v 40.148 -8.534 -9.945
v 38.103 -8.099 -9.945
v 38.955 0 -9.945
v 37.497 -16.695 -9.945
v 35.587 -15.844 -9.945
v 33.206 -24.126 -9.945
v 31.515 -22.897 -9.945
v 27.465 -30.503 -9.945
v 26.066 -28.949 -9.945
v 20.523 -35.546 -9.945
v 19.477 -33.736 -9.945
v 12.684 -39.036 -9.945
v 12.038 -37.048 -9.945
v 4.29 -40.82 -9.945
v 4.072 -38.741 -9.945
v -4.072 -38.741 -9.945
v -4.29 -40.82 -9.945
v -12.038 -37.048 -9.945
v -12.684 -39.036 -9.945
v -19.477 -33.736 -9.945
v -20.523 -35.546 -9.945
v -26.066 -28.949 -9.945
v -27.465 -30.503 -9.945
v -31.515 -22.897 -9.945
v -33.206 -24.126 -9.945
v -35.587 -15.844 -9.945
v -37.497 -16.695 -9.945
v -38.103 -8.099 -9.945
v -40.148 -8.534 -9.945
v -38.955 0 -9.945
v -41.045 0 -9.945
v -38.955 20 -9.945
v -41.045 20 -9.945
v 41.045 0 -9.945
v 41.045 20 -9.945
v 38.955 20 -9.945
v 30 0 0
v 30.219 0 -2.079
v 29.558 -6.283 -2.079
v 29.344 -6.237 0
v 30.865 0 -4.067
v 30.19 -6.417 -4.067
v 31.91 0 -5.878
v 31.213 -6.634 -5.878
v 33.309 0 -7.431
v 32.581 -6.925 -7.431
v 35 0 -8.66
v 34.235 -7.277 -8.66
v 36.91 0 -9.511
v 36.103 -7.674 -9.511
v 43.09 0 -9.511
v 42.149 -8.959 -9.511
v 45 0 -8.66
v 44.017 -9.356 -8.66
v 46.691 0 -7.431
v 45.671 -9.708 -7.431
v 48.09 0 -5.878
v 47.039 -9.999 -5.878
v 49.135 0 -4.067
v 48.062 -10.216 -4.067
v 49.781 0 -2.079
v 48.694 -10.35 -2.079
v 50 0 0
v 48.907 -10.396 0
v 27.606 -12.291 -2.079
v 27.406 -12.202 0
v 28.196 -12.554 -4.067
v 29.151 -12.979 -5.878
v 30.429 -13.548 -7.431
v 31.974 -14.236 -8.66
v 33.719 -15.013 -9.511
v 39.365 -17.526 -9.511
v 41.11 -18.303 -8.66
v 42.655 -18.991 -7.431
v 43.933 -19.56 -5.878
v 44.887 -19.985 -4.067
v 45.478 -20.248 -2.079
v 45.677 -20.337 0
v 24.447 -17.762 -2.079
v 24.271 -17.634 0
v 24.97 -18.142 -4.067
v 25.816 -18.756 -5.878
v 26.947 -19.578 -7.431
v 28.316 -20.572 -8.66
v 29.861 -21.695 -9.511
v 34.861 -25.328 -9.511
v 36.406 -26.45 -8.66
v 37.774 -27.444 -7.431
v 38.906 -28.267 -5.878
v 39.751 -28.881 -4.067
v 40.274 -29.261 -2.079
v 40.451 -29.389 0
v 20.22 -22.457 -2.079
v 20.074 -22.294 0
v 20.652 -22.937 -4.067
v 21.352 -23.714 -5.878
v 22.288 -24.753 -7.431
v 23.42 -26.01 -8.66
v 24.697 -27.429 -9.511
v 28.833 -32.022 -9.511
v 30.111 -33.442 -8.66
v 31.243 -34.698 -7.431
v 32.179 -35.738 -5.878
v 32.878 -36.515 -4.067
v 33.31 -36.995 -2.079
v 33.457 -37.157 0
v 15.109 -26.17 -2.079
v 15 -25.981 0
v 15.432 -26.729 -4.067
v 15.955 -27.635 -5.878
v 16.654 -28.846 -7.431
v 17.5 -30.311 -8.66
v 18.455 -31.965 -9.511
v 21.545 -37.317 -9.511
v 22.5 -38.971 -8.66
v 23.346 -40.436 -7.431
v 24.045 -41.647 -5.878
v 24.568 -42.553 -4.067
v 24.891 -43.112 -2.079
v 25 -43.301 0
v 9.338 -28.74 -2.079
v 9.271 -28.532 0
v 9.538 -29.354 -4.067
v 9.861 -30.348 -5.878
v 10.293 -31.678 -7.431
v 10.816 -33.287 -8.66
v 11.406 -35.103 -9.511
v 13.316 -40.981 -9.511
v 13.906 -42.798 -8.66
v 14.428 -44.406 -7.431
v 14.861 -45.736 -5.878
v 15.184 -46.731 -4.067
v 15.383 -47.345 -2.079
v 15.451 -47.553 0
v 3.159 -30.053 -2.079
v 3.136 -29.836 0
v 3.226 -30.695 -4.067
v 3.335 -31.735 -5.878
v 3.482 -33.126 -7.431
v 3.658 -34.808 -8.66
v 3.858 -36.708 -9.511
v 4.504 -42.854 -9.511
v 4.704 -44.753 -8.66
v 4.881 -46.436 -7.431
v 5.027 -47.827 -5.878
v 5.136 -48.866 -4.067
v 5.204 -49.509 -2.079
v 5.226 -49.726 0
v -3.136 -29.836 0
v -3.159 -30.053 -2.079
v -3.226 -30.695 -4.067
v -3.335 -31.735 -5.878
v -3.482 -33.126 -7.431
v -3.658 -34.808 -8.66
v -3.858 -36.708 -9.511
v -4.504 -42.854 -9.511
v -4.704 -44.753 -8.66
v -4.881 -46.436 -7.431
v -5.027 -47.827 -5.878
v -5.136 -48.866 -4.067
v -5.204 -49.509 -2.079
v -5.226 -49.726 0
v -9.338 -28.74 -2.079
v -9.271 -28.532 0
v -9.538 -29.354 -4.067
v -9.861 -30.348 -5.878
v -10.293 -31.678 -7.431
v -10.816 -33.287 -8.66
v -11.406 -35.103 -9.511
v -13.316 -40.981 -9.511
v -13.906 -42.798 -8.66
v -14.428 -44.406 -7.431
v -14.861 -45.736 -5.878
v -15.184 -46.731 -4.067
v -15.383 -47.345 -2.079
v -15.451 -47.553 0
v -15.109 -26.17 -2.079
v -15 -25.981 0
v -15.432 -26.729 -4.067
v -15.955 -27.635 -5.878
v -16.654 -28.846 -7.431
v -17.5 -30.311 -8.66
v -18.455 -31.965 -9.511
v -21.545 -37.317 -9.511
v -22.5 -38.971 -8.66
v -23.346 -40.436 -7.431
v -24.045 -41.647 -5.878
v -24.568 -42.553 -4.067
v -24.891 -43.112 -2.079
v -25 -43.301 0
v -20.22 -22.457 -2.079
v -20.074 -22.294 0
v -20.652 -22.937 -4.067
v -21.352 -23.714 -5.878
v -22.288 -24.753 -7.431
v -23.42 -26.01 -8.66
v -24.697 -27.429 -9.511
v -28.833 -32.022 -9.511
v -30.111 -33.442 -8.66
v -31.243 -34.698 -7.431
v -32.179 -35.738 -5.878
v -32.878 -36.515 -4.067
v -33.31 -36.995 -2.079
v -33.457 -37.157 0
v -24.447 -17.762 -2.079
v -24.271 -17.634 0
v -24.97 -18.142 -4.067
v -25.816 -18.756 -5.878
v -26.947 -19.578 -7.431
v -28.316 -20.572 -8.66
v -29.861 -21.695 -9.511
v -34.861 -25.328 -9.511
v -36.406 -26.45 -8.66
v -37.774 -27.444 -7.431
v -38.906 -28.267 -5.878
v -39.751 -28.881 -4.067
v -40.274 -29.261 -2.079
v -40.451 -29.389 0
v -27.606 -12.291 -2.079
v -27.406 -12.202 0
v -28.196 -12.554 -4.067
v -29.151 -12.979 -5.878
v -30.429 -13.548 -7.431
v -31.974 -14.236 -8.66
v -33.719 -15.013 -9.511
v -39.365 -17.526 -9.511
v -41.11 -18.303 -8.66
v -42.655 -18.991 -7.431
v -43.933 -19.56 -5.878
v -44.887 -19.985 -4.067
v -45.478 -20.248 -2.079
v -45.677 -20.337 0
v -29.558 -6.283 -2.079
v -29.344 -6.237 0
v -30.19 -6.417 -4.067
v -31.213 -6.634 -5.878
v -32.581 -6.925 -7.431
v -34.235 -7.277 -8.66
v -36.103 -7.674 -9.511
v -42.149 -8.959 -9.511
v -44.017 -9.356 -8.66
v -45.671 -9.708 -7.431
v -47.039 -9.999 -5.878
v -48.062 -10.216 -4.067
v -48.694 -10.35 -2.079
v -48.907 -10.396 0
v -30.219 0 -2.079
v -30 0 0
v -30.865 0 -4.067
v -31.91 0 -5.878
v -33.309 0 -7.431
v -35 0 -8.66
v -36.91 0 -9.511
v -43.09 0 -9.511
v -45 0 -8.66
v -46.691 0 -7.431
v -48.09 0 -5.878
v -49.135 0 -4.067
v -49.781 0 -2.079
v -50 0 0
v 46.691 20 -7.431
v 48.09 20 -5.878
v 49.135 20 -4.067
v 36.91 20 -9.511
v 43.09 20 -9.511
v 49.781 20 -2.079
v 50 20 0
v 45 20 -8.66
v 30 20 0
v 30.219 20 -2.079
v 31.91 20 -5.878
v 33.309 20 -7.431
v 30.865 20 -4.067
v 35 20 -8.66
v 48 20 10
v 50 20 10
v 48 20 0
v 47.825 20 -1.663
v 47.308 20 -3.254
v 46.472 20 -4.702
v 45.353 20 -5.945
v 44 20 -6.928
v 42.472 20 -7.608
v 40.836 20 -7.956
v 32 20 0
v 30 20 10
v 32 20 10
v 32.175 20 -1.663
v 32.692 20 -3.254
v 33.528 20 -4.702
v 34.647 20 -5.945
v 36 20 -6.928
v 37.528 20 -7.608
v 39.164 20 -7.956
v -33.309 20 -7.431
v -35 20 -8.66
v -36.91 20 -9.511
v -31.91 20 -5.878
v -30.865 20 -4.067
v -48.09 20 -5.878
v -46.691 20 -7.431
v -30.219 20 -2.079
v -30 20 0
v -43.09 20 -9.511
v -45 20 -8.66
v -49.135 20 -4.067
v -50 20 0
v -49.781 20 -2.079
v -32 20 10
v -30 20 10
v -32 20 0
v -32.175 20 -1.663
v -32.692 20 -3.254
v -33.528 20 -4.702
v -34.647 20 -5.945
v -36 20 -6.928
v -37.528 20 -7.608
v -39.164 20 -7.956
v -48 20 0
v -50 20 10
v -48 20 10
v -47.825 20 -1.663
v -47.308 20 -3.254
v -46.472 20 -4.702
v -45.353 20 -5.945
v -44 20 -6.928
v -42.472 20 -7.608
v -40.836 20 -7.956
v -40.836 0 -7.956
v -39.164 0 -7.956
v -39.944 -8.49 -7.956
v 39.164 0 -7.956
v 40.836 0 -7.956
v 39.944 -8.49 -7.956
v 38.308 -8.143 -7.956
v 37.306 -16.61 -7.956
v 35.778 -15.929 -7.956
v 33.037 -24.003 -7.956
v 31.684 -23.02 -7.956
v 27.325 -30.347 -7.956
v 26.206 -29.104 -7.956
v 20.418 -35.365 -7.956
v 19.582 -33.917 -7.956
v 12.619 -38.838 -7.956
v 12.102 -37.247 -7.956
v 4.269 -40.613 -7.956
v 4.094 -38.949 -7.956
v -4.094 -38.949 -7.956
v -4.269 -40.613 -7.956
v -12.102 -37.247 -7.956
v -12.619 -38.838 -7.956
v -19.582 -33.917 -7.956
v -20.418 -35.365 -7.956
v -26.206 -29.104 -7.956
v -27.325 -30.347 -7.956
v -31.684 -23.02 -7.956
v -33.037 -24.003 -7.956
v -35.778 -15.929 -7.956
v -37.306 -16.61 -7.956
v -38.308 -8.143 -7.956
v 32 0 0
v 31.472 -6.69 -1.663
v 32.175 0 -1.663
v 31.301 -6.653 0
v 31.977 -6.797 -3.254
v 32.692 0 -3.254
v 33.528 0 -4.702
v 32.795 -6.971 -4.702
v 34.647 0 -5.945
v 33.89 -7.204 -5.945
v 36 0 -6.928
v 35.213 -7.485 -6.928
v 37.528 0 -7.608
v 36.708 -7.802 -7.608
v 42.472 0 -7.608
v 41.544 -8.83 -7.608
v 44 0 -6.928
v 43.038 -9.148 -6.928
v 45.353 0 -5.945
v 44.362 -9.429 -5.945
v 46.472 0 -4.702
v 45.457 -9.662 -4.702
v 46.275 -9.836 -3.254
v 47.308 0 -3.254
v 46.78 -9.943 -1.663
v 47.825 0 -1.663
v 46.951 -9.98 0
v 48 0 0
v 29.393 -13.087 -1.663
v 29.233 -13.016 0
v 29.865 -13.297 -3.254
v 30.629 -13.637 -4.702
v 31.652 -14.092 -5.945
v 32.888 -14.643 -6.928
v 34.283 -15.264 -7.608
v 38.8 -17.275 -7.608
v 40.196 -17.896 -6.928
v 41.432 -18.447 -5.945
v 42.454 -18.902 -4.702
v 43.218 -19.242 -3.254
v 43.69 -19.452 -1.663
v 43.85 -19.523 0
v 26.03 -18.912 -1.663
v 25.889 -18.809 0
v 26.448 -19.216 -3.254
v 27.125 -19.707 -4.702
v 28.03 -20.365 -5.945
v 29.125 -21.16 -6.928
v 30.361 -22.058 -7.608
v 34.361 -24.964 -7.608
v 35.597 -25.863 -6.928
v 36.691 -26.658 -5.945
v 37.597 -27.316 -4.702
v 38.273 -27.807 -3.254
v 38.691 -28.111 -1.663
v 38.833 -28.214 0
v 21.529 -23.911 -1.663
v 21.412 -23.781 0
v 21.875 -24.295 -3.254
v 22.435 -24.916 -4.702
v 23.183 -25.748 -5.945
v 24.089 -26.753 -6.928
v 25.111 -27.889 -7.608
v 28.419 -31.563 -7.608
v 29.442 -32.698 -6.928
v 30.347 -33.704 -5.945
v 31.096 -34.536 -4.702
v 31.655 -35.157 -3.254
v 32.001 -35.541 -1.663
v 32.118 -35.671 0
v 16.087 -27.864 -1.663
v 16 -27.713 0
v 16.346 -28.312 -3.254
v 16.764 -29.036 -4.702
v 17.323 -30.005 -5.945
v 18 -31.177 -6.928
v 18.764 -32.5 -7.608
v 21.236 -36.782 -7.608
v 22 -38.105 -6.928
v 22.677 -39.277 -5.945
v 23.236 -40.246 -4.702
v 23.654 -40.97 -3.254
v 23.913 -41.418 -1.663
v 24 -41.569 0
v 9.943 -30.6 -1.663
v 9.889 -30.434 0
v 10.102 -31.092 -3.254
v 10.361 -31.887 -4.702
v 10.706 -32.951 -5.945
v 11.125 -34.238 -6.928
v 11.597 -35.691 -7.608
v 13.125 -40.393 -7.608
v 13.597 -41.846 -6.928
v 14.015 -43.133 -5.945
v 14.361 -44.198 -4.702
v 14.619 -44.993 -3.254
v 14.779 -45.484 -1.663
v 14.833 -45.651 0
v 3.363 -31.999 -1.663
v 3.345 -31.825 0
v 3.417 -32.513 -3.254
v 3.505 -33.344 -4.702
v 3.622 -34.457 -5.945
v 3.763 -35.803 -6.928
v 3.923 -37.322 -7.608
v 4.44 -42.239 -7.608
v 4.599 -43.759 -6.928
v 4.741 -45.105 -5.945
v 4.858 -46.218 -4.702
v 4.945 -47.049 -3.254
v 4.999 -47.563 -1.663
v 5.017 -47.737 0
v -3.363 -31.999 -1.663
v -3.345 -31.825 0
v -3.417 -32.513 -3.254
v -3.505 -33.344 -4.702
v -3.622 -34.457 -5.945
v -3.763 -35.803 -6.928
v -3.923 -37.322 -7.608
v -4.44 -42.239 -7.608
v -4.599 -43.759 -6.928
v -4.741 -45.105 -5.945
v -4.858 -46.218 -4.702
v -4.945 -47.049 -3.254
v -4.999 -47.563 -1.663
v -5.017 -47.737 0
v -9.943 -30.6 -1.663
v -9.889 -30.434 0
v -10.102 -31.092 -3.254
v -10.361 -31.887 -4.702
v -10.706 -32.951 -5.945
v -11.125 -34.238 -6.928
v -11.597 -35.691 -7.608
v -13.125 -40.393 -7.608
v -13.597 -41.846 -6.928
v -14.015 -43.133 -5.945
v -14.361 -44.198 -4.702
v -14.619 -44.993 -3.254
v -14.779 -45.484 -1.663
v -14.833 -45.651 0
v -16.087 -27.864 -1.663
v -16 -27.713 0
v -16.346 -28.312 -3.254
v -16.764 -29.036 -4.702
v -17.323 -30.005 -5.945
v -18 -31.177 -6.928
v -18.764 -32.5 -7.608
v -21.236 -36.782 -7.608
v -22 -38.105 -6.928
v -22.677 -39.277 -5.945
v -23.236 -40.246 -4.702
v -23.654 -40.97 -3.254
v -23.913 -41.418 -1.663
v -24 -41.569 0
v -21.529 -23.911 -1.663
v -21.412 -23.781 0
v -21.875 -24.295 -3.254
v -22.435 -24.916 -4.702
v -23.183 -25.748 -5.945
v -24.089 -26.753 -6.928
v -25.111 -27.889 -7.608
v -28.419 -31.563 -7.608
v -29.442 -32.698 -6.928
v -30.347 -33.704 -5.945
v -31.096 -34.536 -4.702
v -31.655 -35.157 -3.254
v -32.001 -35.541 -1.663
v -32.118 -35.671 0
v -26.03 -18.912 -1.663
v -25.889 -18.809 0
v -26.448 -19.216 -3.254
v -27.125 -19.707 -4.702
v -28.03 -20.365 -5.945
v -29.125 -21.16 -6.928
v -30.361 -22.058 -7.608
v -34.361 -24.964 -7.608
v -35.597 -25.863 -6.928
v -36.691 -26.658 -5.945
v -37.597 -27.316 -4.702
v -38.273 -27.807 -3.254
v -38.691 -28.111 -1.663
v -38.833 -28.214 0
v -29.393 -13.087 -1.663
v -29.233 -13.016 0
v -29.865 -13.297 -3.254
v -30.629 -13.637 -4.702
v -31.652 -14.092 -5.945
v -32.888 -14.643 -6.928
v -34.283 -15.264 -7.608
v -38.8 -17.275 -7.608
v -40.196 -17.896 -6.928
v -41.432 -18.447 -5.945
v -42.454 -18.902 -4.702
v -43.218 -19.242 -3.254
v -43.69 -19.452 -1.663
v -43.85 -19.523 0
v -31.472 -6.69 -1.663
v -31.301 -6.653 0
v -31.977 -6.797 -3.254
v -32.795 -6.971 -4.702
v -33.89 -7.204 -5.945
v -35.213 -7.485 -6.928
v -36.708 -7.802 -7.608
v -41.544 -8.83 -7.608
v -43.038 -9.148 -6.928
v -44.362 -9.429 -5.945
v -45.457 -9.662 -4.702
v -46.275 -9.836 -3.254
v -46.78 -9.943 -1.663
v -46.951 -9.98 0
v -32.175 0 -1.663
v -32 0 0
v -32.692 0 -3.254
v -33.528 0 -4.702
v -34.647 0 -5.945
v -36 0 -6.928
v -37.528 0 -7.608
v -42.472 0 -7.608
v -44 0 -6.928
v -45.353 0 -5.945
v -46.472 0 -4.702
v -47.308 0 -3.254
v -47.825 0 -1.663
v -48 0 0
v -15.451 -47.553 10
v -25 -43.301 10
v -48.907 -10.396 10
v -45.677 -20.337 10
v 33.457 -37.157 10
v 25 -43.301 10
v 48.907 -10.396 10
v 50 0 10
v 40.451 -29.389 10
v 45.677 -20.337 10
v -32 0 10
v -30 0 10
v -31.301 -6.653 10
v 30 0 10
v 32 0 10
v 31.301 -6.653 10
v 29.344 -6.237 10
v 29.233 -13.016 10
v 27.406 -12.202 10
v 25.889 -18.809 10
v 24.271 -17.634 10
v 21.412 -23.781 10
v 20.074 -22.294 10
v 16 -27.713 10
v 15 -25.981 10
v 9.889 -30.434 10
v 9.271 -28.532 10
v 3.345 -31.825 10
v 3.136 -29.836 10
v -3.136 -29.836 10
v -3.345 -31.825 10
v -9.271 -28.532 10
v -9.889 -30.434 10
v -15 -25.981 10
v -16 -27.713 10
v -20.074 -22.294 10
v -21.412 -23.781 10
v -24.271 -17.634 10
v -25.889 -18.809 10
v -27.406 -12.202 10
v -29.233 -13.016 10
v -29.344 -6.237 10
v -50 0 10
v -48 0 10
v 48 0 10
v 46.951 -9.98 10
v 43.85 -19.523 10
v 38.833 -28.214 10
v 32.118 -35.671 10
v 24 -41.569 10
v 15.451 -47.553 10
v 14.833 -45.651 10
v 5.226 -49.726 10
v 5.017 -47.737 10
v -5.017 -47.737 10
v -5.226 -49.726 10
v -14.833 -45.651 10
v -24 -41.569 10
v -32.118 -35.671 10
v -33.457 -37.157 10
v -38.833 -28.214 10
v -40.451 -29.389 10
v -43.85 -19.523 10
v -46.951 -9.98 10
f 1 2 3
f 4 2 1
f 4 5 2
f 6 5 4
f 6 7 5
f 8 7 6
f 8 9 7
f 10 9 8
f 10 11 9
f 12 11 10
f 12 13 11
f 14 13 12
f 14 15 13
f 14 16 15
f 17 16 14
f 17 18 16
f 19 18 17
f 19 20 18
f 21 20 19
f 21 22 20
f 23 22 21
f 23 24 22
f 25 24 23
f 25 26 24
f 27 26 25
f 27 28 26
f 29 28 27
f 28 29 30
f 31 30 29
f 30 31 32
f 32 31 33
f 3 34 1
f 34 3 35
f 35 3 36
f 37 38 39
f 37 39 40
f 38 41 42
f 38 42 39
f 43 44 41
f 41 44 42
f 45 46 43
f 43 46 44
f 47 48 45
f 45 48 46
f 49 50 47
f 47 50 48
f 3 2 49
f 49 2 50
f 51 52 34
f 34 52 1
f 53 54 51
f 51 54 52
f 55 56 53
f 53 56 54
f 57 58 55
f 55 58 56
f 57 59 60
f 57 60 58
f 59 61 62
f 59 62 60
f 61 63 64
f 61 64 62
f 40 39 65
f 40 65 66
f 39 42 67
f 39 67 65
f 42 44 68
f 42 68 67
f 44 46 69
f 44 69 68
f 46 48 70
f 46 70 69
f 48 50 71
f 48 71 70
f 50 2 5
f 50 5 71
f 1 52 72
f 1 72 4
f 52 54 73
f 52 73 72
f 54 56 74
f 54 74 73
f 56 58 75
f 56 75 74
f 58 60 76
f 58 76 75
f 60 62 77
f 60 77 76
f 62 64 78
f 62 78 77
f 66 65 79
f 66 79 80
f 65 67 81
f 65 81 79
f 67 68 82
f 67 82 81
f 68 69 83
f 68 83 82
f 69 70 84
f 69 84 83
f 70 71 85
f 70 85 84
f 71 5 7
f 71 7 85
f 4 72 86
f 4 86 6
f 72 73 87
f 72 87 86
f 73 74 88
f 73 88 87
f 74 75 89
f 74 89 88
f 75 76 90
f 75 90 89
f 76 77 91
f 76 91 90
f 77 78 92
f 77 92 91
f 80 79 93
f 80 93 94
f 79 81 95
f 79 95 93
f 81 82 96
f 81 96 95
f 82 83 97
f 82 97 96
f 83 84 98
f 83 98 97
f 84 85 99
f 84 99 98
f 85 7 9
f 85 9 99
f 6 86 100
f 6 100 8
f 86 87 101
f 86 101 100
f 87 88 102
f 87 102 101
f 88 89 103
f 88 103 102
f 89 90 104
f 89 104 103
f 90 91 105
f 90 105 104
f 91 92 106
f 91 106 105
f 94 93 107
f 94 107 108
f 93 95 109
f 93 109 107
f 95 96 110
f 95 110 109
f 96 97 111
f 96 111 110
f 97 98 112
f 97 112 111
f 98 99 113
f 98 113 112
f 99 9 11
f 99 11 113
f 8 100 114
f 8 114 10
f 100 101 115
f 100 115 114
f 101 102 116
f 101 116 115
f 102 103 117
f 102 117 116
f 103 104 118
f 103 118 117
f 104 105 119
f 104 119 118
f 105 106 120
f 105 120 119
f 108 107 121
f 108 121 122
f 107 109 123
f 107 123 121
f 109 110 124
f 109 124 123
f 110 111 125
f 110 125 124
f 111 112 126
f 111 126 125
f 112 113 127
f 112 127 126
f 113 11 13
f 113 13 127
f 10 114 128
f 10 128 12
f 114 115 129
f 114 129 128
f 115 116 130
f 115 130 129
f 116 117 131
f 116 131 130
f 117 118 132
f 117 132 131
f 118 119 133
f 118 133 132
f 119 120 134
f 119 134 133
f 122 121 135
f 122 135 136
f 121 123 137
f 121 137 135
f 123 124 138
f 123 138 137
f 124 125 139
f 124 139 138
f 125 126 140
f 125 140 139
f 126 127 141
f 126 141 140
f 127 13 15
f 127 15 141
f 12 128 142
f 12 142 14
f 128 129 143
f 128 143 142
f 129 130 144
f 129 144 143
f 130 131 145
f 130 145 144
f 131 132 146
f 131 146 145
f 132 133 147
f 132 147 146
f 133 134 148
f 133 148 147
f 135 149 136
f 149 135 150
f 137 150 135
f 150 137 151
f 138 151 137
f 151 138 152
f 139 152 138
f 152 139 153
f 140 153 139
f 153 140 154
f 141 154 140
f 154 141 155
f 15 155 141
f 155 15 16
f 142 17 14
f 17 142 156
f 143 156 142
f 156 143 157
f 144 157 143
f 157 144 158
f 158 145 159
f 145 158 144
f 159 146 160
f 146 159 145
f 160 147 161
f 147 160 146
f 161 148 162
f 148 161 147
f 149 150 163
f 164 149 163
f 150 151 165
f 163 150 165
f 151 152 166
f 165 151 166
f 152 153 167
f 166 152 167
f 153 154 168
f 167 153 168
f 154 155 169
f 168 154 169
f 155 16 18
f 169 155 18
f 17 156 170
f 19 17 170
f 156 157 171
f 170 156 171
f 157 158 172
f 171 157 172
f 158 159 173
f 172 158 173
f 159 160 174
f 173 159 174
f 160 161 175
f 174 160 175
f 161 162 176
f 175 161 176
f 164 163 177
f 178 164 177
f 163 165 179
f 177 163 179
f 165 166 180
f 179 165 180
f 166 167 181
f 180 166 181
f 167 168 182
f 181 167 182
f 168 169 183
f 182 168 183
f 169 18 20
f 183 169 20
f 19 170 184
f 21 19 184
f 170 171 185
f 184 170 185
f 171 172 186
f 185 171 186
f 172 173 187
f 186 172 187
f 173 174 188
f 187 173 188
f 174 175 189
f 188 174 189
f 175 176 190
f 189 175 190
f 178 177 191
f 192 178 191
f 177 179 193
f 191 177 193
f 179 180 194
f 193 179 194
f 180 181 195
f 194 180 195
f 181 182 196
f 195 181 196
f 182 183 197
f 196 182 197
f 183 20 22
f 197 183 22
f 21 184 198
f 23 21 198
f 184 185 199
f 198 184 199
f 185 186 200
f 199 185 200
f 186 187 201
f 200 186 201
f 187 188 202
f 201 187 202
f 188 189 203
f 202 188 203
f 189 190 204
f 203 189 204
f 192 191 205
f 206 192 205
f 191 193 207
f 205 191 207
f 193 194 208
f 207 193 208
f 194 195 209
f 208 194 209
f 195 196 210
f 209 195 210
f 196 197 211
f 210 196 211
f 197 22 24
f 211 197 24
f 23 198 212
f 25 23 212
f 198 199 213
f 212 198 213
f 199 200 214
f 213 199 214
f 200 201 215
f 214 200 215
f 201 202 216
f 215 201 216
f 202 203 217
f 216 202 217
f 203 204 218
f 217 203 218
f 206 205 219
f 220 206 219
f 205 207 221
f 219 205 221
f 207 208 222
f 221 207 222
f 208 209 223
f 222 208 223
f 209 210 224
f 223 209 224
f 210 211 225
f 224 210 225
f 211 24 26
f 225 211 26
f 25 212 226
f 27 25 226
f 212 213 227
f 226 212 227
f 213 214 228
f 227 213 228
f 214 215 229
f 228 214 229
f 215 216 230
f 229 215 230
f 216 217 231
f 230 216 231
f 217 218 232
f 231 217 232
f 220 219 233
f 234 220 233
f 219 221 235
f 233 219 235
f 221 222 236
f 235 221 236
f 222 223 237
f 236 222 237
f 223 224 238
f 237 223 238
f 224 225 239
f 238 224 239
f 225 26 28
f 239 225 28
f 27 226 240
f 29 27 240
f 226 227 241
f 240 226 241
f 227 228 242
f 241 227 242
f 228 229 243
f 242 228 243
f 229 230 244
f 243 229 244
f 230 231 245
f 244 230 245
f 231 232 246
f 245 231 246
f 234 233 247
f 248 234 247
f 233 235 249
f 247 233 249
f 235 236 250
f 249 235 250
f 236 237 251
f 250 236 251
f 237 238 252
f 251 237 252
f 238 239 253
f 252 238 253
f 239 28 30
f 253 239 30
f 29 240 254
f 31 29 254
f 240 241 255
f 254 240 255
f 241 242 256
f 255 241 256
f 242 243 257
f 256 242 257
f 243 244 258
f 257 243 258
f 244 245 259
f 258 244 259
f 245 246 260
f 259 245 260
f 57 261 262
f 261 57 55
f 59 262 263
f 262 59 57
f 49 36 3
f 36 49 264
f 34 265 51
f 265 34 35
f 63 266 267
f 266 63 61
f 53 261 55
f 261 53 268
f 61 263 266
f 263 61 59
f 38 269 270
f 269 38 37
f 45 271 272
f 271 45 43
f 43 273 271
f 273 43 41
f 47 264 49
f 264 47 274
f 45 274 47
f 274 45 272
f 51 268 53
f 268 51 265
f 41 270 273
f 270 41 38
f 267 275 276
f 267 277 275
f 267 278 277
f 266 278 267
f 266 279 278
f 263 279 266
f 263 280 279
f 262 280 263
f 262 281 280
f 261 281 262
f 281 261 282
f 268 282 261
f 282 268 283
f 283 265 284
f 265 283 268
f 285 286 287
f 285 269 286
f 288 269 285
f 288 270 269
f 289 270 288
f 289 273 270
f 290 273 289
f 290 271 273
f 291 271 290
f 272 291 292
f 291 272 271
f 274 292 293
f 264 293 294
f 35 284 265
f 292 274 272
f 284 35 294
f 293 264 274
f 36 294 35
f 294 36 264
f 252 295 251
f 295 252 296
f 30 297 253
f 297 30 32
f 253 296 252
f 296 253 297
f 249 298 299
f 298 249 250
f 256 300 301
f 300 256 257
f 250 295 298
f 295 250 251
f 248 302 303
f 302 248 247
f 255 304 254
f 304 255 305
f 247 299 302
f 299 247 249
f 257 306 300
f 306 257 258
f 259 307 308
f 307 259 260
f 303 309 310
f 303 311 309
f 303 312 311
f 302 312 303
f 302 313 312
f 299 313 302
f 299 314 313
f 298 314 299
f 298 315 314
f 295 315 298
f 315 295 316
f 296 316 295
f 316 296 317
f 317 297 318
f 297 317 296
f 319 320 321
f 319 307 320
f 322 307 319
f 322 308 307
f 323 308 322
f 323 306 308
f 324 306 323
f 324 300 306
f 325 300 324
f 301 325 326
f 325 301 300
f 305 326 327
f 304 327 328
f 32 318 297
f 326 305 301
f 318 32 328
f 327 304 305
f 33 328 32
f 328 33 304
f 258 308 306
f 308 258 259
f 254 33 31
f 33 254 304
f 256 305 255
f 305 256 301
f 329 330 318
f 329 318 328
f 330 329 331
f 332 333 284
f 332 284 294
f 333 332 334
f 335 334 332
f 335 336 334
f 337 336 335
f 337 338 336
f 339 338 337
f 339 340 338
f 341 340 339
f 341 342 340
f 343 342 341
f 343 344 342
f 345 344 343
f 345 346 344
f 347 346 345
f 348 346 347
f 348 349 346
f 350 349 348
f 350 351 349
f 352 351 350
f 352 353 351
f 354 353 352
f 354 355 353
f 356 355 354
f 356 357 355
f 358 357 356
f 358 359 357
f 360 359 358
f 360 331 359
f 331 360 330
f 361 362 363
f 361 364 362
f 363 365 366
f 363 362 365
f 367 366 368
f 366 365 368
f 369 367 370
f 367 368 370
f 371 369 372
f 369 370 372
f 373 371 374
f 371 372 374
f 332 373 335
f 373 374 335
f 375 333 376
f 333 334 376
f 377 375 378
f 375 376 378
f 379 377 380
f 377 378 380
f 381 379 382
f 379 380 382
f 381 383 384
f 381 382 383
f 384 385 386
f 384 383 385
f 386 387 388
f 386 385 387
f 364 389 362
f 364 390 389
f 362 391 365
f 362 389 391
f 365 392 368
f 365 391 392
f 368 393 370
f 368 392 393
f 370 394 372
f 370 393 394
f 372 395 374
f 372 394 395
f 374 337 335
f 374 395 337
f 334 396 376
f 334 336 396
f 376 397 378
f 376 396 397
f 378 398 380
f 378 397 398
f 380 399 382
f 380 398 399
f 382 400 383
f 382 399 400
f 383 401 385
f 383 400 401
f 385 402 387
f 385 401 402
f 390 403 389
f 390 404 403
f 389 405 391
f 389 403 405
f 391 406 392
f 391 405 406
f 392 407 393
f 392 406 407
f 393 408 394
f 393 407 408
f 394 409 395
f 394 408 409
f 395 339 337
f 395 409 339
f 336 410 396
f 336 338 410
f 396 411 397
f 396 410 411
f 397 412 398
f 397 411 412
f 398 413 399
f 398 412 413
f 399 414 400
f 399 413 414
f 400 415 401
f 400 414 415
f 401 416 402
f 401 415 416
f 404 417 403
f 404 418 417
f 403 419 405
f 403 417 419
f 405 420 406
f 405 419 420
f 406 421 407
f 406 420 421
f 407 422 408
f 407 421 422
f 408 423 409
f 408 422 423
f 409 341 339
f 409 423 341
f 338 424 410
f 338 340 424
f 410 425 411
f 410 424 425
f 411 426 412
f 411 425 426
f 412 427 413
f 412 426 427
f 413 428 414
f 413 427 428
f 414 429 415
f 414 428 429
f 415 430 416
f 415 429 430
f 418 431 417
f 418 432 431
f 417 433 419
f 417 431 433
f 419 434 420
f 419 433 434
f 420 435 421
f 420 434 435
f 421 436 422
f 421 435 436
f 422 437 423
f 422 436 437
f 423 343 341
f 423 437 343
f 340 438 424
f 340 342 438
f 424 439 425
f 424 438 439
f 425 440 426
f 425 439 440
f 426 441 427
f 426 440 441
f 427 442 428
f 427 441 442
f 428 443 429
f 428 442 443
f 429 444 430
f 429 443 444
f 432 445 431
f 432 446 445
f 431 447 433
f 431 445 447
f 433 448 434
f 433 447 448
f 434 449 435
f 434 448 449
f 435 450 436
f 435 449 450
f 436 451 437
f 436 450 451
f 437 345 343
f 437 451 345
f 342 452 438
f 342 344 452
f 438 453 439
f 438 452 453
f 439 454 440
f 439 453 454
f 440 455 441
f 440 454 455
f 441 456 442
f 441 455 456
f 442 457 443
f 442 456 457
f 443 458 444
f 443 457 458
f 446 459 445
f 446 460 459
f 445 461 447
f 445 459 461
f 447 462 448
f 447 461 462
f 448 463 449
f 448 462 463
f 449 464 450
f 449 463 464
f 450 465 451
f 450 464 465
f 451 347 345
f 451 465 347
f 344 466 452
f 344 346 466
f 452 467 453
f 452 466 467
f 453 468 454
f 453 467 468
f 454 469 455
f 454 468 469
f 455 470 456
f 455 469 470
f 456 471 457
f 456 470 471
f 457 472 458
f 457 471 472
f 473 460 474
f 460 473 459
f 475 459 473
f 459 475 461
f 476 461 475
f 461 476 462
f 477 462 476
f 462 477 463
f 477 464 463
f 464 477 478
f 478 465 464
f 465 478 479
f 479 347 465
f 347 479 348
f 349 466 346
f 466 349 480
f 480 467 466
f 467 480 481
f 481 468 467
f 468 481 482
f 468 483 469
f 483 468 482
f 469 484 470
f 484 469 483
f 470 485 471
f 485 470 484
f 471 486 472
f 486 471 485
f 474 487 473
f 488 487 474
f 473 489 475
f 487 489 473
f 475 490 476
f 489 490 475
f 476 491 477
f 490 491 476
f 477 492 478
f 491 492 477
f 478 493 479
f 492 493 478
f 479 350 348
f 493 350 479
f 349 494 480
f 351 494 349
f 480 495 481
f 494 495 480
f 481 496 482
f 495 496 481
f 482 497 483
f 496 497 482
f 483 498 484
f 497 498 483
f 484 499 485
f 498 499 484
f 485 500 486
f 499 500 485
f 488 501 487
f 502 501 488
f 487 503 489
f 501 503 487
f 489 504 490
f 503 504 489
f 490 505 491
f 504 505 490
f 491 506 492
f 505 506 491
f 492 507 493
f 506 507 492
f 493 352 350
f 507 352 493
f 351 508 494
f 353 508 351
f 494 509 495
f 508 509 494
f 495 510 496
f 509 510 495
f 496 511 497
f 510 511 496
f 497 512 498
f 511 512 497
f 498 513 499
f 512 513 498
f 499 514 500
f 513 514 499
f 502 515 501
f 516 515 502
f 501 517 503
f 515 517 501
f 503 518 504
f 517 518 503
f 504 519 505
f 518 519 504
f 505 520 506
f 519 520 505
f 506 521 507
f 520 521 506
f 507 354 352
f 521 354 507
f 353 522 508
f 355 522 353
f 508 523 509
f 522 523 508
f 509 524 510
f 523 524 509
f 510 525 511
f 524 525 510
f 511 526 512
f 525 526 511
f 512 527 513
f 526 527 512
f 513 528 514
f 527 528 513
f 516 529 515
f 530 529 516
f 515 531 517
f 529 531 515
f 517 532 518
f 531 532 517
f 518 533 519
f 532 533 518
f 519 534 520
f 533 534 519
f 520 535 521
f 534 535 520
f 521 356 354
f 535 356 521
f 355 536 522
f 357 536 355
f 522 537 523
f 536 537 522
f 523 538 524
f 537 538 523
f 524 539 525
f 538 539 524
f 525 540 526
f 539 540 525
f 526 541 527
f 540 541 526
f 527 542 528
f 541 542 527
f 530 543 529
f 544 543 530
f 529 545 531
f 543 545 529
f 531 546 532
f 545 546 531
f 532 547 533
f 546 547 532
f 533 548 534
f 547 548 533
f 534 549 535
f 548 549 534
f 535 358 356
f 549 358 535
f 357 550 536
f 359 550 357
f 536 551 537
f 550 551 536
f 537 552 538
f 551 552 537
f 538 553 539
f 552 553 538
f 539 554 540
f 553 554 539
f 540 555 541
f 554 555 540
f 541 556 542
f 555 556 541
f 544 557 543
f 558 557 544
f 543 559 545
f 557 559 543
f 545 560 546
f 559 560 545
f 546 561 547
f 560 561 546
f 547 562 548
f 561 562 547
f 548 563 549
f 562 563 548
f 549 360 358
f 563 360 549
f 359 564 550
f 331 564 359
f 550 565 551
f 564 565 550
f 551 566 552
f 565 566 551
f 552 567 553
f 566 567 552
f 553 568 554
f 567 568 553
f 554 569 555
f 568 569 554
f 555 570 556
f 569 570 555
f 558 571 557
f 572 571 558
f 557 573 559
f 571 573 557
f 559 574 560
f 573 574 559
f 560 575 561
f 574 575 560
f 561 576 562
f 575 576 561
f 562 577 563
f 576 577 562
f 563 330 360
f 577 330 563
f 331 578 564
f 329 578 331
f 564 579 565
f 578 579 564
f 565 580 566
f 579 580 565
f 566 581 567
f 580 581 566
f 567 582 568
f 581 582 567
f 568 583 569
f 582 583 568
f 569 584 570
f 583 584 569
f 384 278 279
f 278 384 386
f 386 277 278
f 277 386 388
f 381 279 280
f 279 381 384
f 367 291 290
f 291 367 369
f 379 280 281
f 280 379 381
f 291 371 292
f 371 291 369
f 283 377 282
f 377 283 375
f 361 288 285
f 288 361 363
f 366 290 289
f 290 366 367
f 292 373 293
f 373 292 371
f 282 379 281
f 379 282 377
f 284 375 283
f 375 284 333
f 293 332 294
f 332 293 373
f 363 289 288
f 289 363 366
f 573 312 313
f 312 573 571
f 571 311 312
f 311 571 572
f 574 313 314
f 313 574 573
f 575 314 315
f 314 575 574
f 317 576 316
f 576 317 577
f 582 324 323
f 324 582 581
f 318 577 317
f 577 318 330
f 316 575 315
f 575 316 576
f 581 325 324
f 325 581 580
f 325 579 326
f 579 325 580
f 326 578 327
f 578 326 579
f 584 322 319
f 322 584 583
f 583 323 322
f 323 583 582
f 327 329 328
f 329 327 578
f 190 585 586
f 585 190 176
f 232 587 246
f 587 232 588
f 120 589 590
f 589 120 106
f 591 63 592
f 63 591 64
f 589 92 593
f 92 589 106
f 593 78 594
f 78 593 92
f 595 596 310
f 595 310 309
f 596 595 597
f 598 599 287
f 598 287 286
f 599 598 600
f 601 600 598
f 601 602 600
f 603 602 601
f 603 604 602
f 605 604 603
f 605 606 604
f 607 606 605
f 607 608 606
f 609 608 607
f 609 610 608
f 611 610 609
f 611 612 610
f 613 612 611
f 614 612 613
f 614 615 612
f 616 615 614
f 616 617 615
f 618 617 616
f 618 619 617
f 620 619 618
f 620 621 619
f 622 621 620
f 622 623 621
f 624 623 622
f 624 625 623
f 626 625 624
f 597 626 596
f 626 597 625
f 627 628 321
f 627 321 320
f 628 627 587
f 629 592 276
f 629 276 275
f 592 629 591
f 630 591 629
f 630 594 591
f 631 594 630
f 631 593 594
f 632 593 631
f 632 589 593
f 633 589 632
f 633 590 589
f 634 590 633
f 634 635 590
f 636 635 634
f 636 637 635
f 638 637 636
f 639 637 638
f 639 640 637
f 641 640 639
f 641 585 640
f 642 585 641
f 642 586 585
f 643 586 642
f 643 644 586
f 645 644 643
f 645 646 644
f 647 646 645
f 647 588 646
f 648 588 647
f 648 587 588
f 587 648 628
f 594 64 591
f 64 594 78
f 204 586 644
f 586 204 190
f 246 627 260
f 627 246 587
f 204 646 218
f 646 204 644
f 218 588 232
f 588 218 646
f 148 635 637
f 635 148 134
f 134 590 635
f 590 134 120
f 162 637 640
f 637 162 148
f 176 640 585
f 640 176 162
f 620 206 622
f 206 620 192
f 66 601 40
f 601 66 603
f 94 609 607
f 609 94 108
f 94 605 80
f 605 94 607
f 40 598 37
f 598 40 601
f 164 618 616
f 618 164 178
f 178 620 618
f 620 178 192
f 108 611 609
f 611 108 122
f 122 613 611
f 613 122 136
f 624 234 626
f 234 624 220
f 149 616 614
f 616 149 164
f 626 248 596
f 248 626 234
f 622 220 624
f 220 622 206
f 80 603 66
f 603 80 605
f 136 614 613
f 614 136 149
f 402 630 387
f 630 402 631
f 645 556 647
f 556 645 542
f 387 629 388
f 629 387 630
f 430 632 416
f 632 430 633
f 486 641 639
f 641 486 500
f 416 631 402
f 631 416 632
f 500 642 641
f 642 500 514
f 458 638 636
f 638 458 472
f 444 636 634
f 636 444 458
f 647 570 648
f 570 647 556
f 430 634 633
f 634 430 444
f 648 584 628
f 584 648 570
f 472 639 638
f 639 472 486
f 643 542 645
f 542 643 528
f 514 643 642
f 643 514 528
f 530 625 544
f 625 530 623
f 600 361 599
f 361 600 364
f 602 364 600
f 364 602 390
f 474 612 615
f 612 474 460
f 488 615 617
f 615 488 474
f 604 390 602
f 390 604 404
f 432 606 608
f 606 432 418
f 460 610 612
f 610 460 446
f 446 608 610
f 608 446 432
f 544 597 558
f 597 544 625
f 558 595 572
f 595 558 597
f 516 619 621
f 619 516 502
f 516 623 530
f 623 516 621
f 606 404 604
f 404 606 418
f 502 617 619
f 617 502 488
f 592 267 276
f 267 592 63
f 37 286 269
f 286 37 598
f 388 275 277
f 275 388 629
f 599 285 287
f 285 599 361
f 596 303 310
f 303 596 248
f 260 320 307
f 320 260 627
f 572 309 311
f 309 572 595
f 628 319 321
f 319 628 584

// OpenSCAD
// file: bend.scad
difference() {
  u(40,10,20);
  u(40,8,21);
  translate([-50,-50,0]) cube([50*2,100,10]);
}


difference() {
difference() {
  cylinder(r=40+10,h=10);
  translate([0,0,-0.1]) cylinder(r=40-10,h=10.2);
}

translate([0,0,-0.1]) difference() {
  cylinder(r=40+8,h=10.2);
  translate([0,0,-0.1]) cylinder(r=40-8,h=10.4);
}
  translate([-50,0,-0.1]) cube([50*2,100,10.2]);

}

translate([30,0,0]) difference() {
  cube([20,20,10]);
  translate([2,0,-0.1]) cube([16,21,10.2]);
}


translate([-50,0,0]) difference() {
  cube([20,20,10]);
  translate([2,0,-0.1]) cube([16,21,10.2]);
}


module u(r1,r2,h) {
  difference() {
    torus(r1,r2);
    translate([-(r1+r2),0,-r2]) cube([(r1+r2)*2,(r1+r2),r2*2]);
  }
  translate([r1,0,0]) rotate([-90,0,0]) cylinder(r=r2,h=h);
  translate([-r1,0,0]) rotate([-90,0,0]) cylinder(r=r2,h=h);

}

module torus(r1,r2) {
  rotate_extrude(convexity = 10, $fn=$fn)
    translate([r1, 0, 0])
    circle(r = r2, $fn=$fn);
}
// file: fillet.scad
/*Fillet modules*/ {
    module myfillet(r=1.0,steps=3,include=true) {
      if(include) for (k=[0:$children-1]) {
        children(k);
      }
      for (i=[0:$children-2] ) {
        for(j=[i+1:$children-1] ) {
        fillet_two(r=r,steps=steps) {
          children(i);
          children(j);
          intersection() {
            children(i);
            children(j);
          }
        }
        }
      }
    }

    module fillet_two(r=1.0,steps=3) {
      for(step=[1:steps]) {
        hull() {
           render() intersection() {
            children(0);
            offset_3d(r=r*step/steps) children(2);
          }
           render() intersection() {
            children(1);
            offset_3d(r=r*(steps-step+1)/steps) children(2);
          }
        }
      }
    }

    module offset_3d(r=1.0) {
      for(k=[0:$children-1]) minkowski() {
        children(k);
        sphere(r=r,$fn=8);
      }
    }

}
// file: BOSL2/std.scad
// Minimal BOSL2 compatibility shim for bundled gallery models.
// It implements only the helpers used by the imported OpenSCAD projects.

CENTER = [0, 0, 0];
BOTTOM = [0, 0, -1];
TOP = [0, 0, 1];
LEFT = [-1, 0, 0];
RIGHT = [1, 0, 0];
FRONT = [0, -1, 0];
BACK = [0, 1, 0];

module up(z=0) {
    translate([0, 0, z]) children();
}

module down(z=0) {
    translate([0, 0, -z]) children();
}

module attach(anchor=CENTER) {
    children();
}

module cuboid(size=[1, 1, 1], anchor=CENTER) {
    center = anchor == CENTER;
    translate(center ? [0, 0, 0] : [0, 0, size[2] / 2])
        cube(size, center=true);
    children();
}

module xcyl(h=1, r=1, anchor=CENTER) {
    center = anchor == CENTER;
    translate(center ? [0, 0, 0] : [h / 2, 0, 0])
        rotate([0, 90, 0])
            cylinder(h=h, r=r, center=true);
}
// main file
include <BOSL2/std.scad>;
include <fillet.scad>;
include <bend.scad>;

$fn = $preview ? 15 : 30;

// Fillet params
fillet_r = 4.25;
fillet_steps = $preview ? 4 : 6;

// Plate parameters
plate_w = 83;
plate_l = 110;
plate_t = 4;
curve_r = 225;

ellipse_fn = $preview ? 20 : 100;
bend_fn = $preview ? 8 : 25;
curve_fn = bend_fn/(plate_l/(2*PI*curve_r)) / 4;


// Nub parameters
nub_h = 9;
nub_base_d = 5;
nub_ball_d = 4.5;
nub_arc = 11.5;
nub_angle = 5;

// Belt measurements
belt_w = 38;
belt_t = 3;

// Bolt Holder parameters
// This is how high the centre of the bolt hole is
holder_h = 6;
holder_w = 9;
holder_t = 11;
holder_arc = 5.5;
hole_d = 3.5;
// distance between belt and holder on either side
belt_holder_gap = 2;
holder_spacing = belt_w + 2*belt_holder_gap;

// Back text
line1 = "Toshi Taperek";
line2 = "UCalgary GNCTR 2024";
back_text_size = 3;
line_spacing = 2*back_text_size;
text_depth = 0.5;
include_signature = false;

// Logo
y_padding = 10;
include_logo = false;

trim_w = 6;
trim_h = 2;
emboss_depth = 2;


module plate()
{
	zrot(90)
	down(trim_h)
	xrot(
		-360*plate_l/(2*PI*curve_r)/2,
		cp=[0, 0, curve_r]
	)
	cylindric_bend(
		[plate_w, plate_l, plate_t+trim_h],
		curve_r,
		$fn=bend_fn
	)
	up(plate_t+trim_h)
	zflip()
	{
		translate([plate_w/2, plate_l/2, 0])
		resize([plate_w, plate_l, plate_t])
		cyl(l=1, d=1, anchor=BOTTOM, $fn=ellipse_fn);
		
		/*
		color("red")
		translate([y_padding, plate_l/2, plate_t])
		xflip()
		resize([0, plate_w - 2*y_padding, 0], auto=true)
		zrot(90)
		left(88.25)
		linear_extrude(emboss_depth)
		import(
			"/home/toshi/gnctr/logo/logo_inside.svg"
		);*/
		
		translate([plate_w/2, plate_l/2, plate_t])
		resize([plate_w, plate_l, trim_h*2])
		torus(plate_w, trim_w/2, $fn=ellipse_fn);
	}
}


module nub()
{
    cylinder(
        h=nub_h,
        r1=nub_base_d/2,
        r2=0.5
    );
    up(nub_h - nub_ball_d/2)
    sphere(d=nub_ball_d);
}

module holder(capped)
{
    difference() {
        // Holder
        union() {
            cube([holder_w, holder_t, holder_h]);
            up(holder_h)
            ycyl(
                l=holder_t,
                d=holder_w,
                anchor=LEFT+FRONT
            );
        }
        // Hole
		translate([
            holder_w/2,
            capped ? holder_t/4 : -1,
            holder_h
        ])
        ycyl(l=2*holder_t, d=hole_d, anchor=FRONT);
    }
}

module back_text()
{
	back(plate_w/2)
    up(curve_r)
    yflip()
    cylindrical_extrude(
        ir=curve_r-plate_t-1,
        or=curve_r-plate_t+text_depth,
        orient=FWD,
        $fn=curve_fn
    ) {
        // First line
        back(line_spacing/2)
        text(
            line1,
            size=back_text_size,
            font="DejaVu Sans:style=Bold",
            halign="center",
            valign="center"
        );
        // Second line
        fwd(line_spacing/2)
        text(
            line2,
            size=back_text_size,
            font="DejaVu Sans:style=Bold",
            halign="center",
            valign="center"
        );
    }
}

module buckle()
{
	// Each feature to be filleted needs to be a separate child
	myfillet(r=fillet_r, steps=fillet_steps) {
		plate();
		
		// Top Holder
		up(plate_t)
		yrot(a=holder_arc, cp=[0, 0, curve_r])
		back(plate_w/2 + holder_spacing/2)
		holder(false);
		
		// Bottom holder
		up(plate_t)
		yrot(a=holder_arc, cp=[0, 0, curve_r])
		back(
			plate_w/2 - holder_spacing/2 - holder_t
		)
		holder(true);
		
		// Nub
		up(plate_t)
		back(plate_w/2)
		// Nub position
		yrot(a=-nub_arc, cp=[0, 0, curve_r])
		yrot(a=-nub_angle)  // Extra angling
		nub();
	}
}


module logo() {
	down(curve_r-plate_t)
	cylindrical_extrude(
		ir=curve_r-plate_t,
		or=curve_r-plate_t+emboss_depth,
		orient=BACK,
		$fn=curve_fn
	)
	back(10)
	//left(40.7)
	resize([0, plate_w - 2*y_padding, 0], auto=true)
	left(88.25)
	import("logo.svg");
}


module final()
{
	if (include_logo)
		logo();
	xflip()
	zflip()
	difference() {
		buckle();
		if (include_signature)
			back_text();
	}
}


//final();
